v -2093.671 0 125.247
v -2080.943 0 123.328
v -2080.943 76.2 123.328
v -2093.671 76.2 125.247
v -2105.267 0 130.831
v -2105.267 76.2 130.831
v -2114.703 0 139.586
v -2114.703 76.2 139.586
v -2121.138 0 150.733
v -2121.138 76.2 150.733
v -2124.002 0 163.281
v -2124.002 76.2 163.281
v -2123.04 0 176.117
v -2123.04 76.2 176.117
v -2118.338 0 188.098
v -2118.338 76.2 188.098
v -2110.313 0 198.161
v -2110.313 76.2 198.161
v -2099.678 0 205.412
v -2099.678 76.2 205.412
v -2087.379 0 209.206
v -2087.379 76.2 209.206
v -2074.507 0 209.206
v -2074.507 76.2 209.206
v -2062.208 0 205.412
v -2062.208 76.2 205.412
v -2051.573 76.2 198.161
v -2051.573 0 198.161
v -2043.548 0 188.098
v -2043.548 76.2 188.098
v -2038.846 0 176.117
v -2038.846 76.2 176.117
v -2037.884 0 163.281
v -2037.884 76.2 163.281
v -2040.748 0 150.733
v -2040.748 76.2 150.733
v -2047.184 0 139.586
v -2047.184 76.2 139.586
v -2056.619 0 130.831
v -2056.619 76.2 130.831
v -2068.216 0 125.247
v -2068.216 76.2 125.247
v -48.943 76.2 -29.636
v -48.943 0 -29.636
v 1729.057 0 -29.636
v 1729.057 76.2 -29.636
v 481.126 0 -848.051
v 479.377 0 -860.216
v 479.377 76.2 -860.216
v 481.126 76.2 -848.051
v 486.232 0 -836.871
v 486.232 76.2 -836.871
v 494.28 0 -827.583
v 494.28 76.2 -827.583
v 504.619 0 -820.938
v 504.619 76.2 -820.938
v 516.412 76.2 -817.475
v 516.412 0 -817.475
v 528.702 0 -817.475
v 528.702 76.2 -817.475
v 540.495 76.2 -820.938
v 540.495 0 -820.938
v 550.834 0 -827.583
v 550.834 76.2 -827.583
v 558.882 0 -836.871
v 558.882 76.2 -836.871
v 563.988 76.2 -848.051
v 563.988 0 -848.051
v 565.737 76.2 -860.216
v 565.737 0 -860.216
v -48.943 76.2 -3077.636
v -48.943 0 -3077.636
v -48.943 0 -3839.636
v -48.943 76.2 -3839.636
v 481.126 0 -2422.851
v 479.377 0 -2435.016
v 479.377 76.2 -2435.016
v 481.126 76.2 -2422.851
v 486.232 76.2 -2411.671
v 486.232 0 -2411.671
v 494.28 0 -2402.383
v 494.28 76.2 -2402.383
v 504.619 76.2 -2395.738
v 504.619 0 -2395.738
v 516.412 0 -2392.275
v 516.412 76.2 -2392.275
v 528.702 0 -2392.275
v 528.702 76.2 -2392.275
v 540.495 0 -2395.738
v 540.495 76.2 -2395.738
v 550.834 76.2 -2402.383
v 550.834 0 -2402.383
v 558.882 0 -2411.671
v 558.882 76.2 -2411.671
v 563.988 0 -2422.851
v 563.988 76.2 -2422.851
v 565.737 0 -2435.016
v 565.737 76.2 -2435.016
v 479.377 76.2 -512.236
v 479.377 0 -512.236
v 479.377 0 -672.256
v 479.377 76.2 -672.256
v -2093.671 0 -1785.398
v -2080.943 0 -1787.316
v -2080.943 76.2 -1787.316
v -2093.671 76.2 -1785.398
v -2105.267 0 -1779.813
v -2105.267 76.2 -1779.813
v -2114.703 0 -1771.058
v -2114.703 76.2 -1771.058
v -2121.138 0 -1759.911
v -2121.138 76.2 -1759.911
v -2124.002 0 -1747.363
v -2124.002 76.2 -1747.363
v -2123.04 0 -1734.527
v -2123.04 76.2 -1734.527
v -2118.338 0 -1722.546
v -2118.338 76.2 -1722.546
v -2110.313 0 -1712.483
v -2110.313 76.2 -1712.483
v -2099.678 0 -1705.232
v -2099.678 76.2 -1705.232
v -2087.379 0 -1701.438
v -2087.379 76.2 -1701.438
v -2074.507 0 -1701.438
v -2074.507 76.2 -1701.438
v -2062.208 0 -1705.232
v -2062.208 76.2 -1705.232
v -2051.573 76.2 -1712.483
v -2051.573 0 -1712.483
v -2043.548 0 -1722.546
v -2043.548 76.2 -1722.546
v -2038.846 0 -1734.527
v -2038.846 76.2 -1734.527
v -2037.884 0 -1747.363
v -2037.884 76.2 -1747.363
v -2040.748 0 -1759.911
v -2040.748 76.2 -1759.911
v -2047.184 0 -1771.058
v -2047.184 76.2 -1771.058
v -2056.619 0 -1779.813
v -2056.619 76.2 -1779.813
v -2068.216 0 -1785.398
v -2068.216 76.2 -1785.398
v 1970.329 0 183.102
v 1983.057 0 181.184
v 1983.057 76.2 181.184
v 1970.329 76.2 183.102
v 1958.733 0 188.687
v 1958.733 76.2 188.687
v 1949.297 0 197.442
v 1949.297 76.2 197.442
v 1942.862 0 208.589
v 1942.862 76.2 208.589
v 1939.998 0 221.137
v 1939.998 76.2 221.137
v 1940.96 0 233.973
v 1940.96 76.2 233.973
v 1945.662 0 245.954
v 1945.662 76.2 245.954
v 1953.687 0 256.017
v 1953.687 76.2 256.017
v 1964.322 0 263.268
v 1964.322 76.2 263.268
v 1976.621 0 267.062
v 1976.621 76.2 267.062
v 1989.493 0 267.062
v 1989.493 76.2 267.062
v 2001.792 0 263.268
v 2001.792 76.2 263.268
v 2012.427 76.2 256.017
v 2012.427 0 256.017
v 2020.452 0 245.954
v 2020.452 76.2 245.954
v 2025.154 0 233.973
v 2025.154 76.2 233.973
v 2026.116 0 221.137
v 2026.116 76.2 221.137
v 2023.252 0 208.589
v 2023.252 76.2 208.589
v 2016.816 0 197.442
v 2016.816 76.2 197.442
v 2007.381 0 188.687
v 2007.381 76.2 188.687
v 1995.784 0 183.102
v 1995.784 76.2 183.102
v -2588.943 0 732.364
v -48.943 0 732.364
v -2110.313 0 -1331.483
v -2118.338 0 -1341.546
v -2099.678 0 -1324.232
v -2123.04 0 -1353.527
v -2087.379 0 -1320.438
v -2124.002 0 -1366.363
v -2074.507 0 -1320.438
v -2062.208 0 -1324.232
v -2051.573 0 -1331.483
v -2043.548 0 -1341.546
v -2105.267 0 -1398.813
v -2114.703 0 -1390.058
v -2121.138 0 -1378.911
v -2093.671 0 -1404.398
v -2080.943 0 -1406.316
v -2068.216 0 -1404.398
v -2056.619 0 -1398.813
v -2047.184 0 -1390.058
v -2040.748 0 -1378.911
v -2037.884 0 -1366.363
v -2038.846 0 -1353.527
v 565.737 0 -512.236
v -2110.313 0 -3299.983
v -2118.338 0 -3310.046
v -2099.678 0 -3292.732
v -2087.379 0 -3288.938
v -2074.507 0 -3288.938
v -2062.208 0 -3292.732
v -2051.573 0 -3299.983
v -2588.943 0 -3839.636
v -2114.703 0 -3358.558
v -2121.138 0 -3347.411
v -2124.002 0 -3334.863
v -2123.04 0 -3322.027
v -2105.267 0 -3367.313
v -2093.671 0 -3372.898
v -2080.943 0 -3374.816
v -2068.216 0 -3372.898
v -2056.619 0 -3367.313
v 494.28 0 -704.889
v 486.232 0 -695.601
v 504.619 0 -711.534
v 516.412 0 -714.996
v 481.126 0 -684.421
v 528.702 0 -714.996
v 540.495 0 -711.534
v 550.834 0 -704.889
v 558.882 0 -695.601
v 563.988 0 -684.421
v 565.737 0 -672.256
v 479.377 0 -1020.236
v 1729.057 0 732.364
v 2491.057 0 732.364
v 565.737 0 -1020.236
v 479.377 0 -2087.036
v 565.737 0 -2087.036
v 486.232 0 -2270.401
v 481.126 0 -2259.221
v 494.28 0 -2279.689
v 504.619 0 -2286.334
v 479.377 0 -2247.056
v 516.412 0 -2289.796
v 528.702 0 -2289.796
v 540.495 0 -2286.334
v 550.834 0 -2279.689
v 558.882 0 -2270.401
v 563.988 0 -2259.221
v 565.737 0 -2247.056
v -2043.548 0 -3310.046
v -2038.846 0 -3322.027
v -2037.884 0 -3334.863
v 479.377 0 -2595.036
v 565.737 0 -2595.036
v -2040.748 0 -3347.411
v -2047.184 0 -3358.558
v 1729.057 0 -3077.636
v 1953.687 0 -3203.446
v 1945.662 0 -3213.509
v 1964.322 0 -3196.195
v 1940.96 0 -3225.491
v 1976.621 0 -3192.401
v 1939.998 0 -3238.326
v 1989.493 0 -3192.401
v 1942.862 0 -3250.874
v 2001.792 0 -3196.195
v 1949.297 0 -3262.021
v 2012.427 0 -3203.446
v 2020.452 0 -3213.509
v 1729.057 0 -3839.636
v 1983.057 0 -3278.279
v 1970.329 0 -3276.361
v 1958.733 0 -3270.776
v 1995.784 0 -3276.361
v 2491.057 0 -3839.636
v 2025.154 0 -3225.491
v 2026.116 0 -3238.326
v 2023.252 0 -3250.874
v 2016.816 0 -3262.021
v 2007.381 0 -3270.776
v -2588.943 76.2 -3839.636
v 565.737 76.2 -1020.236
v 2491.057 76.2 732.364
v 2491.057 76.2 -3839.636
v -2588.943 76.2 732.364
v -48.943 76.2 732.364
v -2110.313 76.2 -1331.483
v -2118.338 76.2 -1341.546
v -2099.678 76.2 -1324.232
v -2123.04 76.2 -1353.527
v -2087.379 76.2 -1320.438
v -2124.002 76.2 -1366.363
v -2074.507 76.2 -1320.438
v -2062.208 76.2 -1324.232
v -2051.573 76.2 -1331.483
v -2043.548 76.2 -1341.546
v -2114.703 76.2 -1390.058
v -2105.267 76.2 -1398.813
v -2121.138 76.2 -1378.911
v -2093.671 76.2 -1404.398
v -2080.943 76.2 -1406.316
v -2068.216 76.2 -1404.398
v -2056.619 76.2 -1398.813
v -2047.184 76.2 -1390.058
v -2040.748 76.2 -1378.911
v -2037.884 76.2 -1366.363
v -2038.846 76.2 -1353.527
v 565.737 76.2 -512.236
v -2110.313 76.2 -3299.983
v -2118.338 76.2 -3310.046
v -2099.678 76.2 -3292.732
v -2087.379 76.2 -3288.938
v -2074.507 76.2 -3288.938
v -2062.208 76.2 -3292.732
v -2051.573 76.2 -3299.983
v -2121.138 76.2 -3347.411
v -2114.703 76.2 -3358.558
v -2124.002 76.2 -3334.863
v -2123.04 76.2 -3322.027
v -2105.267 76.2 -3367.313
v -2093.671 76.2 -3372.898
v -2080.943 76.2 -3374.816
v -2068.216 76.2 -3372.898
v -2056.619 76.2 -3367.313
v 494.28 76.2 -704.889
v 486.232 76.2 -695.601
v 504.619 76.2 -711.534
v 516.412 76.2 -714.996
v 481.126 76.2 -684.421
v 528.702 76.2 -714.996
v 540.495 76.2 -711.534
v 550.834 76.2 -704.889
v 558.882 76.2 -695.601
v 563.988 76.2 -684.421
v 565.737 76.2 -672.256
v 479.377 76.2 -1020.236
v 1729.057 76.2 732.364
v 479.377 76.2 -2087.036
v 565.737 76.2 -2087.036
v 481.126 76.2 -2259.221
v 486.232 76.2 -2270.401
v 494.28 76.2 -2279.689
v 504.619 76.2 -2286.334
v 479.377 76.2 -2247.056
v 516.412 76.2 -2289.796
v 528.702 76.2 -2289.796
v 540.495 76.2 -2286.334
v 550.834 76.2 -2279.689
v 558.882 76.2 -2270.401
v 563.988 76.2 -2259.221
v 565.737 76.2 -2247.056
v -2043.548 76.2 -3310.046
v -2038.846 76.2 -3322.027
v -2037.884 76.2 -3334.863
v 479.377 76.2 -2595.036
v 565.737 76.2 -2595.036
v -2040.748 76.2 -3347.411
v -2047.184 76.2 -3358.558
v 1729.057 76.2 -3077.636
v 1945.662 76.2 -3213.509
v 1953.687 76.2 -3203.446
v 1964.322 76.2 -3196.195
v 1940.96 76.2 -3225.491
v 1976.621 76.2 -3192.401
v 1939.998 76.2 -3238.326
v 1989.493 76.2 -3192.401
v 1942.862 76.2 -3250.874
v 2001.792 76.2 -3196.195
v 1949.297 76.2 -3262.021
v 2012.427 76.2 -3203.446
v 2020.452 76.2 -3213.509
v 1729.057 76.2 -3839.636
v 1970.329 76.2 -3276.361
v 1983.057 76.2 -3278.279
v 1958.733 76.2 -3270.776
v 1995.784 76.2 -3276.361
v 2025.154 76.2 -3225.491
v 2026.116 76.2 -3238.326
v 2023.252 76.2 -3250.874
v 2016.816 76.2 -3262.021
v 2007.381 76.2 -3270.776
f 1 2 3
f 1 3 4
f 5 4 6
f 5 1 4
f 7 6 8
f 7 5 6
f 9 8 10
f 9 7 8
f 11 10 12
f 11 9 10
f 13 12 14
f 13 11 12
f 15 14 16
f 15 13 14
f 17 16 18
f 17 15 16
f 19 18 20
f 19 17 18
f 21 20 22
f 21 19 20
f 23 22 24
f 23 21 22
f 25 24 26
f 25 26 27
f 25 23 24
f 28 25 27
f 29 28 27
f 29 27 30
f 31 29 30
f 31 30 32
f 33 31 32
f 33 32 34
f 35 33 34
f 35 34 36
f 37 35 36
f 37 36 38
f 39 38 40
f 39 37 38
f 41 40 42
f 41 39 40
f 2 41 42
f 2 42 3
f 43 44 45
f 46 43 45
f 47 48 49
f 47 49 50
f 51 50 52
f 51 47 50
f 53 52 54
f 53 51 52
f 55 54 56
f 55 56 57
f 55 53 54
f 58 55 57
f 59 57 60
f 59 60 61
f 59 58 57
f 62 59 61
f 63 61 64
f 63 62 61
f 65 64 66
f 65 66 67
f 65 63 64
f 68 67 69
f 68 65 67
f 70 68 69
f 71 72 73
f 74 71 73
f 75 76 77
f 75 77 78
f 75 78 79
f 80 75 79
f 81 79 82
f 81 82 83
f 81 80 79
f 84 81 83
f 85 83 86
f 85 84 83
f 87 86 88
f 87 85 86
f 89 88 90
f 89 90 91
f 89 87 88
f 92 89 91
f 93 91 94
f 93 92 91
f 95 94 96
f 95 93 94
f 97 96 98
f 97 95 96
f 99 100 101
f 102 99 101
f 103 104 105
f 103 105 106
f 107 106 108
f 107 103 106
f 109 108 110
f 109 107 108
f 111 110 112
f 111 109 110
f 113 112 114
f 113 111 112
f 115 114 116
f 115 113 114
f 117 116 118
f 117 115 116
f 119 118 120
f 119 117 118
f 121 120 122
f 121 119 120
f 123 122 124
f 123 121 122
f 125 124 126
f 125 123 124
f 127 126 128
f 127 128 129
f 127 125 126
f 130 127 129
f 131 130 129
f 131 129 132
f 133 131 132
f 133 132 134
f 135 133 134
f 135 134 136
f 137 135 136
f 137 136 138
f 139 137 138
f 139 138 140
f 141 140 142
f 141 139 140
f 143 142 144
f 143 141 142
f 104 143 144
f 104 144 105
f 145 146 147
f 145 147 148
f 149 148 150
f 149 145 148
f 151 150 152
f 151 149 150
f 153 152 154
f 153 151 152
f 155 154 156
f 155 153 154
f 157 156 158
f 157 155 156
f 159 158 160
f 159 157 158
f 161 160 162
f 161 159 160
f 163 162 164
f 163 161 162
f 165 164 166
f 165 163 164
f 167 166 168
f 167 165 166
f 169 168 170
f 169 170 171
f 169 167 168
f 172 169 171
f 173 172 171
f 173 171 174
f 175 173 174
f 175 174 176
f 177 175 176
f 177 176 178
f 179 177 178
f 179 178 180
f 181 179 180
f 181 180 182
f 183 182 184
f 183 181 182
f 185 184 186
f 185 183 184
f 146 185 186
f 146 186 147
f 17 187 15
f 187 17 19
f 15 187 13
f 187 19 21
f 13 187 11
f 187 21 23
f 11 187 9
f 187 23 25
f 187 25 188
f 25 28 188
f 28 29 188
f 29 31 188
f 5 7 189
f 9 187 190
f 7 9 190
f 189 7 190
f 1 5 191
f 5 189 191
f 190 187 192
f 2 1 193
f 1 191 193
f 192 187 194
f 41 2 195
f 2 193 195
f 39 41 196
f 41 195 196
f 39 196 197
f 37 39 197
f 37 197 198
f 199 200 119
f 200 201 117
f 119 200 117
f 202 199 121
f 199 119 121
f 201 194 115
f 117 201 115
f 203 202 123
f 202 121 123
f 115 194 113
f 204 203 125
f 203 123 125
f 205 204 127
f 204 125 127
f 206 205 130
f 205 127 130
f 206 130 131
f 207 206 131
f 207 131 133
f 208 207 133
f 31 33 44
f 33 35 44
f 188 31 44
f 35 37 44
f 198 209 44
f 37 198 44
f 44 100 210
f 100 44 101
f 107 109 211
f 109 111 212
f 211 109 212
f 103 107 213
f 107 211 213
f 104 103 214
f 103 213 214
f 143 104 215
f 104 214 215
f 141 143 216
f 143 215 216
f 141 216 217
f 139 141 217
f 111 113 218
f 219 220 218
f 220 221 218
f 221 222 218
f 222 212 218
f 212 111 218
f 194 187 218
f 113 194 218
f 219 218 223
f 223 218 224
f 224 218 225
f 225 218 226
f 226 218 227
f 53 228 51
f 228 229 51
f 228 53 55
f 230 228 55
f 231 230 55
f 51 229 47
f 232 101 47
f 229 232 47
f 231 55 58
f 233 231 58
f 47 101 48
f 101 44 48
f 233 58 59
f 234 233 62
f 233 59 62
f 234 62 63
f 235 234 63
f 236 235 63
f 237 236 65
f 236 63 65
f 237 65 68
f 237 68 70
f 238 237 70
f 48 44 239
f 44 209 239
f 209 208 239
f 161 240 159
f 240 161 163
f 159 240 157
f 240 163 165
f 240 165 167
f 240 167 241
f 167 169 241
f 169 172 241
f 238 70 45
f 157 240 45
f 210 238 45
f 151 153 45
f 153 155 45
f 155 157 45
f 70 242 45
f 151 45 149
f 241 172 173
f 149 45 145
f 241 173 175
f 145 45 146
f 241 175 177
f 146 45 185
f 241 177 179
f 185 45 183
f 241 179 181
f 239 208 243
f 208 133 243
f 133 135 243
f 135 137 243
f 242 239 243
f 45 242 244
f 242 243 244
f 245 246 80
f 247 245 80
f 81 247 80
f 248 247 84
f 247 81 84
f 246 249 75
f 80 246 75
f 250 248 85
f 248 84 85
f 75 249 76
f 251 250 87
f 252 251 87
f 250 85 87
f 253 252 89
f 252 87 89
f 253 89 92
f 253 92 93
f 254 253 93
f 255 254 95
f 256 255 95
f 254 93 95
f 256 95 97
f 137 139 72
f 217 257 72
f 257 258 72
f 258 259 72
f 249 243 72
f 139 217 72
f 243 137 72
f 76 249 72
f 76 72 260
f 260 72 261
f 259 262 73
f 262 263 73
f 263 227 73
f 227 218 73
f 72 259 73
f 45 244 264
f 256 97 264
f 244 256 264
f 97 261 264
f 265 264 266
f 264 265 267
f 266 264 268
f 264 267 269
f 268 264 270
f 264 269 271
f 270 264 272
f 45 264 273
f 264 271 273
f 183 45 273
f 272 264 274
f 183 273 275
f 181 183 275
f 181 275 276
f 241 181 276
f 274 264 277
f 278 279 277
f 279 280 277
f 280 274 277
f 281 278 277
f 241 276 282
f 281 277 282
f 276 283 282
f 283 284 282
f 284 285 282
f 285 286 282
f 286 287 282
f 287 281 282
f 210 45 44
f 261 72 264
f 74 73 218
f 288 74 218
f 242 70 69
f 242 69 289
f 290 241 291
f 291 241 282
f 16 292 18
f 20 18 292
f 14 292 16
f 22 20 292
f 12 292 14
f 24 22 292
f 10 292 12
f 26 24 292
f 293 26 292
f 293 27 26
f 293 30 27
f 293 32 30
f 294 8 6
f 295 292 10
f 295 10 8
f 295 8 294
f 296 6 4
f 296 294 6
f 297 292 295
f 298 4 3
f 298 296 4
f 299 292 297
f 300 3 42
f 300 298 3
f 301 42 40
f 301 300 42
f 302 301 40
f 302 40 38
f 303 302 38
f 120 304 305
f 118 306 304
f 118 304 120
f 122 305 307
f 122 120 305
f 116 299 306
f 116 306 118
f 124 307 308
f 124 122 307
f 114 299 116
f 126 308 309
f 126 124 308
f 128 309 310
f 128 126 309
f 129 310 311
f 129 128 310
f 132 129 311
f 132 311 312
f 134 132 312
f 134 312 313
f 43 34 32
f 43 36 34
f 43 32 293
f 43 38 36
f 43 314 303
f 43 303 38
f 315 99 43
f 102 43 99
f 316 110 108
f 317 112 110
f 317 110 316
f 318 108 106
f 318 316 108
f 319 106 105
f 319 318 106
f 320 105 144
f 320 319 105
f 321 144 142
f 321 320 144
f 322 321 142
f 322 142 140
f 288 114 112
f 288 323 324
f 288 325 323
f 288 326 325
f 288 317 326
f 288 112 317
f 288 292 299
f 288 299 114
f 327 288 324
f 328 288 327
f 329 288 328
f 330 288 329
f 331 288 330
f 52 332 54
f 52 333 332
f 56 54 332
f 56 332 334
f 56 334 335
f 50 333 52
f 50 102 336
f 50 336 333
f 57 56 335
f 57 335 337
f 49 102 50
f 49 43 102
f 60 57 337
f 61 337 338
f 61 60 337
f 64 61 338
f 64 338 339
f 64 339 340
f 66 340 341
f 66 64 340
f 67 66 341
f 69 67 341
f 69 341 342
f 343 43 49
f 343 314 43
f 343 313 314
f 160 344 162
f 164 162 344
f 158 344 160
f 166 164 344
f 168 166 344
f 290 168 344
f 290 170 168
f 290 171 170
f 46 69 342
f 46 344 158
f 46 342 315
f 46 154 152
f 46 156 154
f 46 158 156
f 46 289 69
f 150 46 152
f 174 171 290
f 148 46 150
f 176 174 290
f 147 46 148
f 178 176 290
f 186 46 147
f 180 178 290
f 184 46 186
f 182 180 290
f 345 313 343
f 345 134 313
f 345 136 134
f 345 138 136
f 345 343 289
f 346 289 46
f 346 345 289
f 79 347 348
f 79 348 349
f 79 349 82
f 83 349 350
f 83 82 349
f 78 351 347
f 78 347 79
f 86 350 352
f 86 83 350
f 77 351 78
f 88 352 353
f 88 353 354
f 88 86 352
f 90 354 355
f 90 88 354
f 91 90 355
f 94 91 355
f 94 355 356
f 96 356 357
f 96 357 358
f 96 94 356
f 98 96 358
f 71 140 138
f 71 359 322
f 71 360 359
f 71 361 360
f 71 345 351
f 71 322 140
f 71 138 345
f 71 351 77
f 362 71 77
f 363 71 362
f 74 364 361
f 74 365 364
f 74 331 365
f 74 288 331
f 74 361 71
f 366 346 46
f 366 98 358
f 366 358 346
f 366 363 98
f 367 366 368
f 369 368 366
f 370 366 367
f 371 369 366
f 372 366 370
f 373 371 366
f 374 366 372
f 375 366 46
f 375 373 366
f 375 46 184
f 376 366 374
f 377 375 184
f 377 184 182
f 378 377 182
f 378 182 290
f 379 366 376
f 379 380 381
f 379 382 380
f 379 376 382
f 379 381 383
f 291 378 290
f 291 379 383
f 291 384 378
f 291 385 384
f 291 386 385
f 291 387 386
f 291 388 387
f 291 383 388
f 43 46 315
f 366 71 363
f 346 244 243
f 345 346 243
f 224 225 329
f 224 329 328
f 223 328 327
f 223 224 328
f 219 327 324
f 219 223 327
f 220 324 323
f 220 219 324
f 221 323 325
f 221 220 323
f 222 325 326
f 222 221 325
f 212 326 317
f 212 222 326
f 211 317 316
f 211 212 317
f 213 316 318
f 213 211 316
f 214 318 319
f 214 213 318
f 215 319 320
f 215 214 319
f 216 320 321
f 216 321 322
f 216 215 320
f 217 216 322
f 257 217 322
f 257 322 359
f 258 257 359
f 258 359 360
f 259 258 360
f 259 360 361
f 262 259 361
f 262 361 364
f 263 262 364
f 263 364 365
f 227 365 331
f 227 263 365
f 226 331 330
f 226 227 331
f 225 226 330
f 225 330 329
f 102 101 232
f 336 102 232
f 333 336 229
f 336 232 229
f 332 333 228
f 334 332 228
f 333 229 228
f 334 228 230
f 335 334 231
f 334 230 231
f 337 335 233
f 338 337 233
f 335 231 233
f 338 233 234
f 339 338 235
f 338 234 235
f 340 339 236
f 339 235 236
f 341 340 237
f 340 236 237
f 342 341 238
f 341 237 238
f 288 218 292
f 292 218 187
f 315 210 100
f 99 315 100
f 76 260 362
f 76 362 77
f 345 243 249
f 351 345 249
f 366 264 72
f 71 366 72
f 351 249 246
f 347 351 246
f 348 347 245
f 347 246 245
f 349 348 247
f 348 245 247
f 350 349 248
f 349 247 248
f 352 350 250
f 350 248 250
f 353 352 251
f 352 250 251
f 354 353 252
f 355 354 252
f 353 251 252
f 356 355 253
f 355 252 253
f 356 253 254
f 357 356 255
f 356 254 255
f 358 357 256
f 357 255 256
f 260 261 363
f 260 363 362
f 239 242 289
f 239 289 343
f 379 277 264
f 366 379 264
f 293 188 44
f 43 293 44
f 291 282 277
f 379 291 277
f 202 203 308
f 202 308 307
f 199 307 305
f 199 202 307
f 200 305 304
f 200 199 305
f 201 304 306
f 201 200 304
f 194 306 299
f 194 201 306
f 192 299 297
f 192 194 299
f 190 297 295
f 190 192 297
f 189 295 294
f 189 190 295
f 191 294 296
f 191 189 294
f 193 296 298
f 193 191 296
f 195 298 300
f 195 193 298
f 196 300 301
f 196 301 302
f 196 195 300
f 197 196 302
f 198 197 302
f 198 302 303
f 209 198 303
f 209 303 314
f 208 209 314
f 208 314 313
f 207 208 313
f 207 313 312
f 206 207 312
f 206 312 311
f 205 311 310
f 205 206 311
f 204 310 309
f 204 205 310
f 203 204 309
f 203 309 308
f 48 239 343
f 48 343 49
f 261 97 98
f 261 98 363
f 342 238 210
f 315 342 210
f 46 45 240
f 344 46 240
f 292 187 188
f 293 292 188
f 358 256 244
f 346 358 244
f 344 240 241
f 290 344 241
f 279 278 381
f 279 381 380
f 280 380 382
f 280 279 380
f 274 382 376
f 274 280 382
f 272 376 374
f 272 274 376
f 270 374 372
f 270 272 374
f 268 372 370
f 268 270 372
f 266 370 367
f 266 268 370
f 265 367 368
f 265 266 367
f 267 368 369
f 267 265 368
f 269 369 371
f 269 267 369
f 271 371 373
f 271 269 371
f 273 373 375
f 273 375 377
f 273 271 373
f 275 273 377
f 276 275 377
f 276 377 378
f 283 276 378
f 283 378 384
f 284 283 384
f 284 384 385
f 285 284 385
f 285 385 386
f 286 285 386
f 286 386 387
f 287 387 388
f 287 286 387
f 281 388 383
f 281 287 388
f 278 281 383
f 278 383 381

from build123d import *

# Parameters (mm, degrees)
SKETCH1_R           = 43.18
BOSS_EXTRUDE1_DEPTH = 76.2


with BuildPart() as part:
    # Sketch1 → Boss-Extrude1 (new body)
    with BuildSketch(Plane(origin=(0, 0, 0), x_dir=(1, 0, 0), z_dir=(0, 1, 0))):
        Polygon((-48.943073508, 29.635887653), (1729.056926492, 29.635887653), (1729.056926492, -732.364112347), (2491.056926492, -732.364112347), (2491.056926492, 3839.635887653), (1729.056926492, 3839.635887653), (1729.056926492, 3077.635887653), (-48.943073508, 3077.635887653), (-48.943073508, 3839.635887653), (-2588.943073508, 3839.635887653), (-2588.943073508, -732.364112347), (-48.943073508, -732.364112347), align=None)
        with Locations(Location((-2080.943073508, -166.508163088, 0), (0, 0, 90))):
            Circle(SKETCH1_R, mode=Mode.SUBTRACT)
        with Locations(Location((-2080.943073508, 1744.135887653, 0), (0, 0, 90))):
            Circle(SKETCH1_R, mode=Mode.SUBTRACT)
        with Locations(Location((-2080.943073508, 1363.135887653, 0), (0, 0, 90))):
            Circle(SKETCH1_R, mode=Mode.SUBTRACT)
        with Locations(Location((-2080.943073508, 3331.635887653, 0), (0, 0, 90))):
            Circle(SKETCH1_R, mode=Mode.SUBTRACT)
        with Locations(Location((1983.056926492, -224.364112347, 0), (0, 0, 90))):
            Circle(SKETCH1_R, mode=Mode.SUBTRACT)
        with Locations(Location((1983.056926492, 3235.099053778, 0), (0, 0, 90))):
            Circle(SKETCH1_R, mode=Mode.SUBTRACT)
        with BuildLine():
            Line((565.736926492, 2435.015887653), (565.736926492, 2595.035887653))
            Line((565.736926492, 2595.035887653), (479.376926492, 2595.035887653))
            Line((479.376926492, 2595.035887653), (479.376926492, 2435.015887653))
            ThreePointArc((479.376926492, 2435.015887653), (522.556926492, 2391.835887653), (565.736926492, 2435.015887653))
        make_face(mode=Mode.SUBTRACT)
        with BuildLine():
            Line((565.736926492, 2247.055887653), (565.736926492, 2087.035887653))
            Line((565.736926492, 2087.035887653), (479.376926492, 2087.035887653))
            Line((479.376926492, 2087.035887653), (479.376926492, 2247.055887653))
            ThreePointArc((479.376926492, 2247.055887653), (522.556926492, 2290.235887653), (565.736926492, 2247.055887653))
        make_face(mode=Mode.SUBTRACT)
        with BuildLine():
            Line((479.376926492, 1020.235887653), (479.376926492, 860.215887653))
            ThreePointArc((479.376926492, 860.215887653), (522.556926492, 817.035887653), (565.736926492, 860.215887653))
            Line((565.736926492, 860.215887653), (565.736926492, 1020.235887653))
            Line((565.736926492, 1020.235887653), (479.376926492, 1020.235887653))
        make_face(mode=Mode.SUBTRACT)
        with BuildLine():
            Line((479.376926492, 512.235887653), (479.376926492, 672.255887653))
            ThreePointArc((479.376926492, 672.255887653), (522.556926492, 715.435887653), (565.736926492, 672.255887653))
            Line((565.736926492, 672.255887653), (565.736926492, 512.235887653))
            Line((565.736926492, 512.235887653), (479.376926492, 512.235887653))
        make_face(mode=Mode.SUBTRACT)
    extrude(amount=BOSS_EXTRUDE1_DEPTH)


solid = part.part
